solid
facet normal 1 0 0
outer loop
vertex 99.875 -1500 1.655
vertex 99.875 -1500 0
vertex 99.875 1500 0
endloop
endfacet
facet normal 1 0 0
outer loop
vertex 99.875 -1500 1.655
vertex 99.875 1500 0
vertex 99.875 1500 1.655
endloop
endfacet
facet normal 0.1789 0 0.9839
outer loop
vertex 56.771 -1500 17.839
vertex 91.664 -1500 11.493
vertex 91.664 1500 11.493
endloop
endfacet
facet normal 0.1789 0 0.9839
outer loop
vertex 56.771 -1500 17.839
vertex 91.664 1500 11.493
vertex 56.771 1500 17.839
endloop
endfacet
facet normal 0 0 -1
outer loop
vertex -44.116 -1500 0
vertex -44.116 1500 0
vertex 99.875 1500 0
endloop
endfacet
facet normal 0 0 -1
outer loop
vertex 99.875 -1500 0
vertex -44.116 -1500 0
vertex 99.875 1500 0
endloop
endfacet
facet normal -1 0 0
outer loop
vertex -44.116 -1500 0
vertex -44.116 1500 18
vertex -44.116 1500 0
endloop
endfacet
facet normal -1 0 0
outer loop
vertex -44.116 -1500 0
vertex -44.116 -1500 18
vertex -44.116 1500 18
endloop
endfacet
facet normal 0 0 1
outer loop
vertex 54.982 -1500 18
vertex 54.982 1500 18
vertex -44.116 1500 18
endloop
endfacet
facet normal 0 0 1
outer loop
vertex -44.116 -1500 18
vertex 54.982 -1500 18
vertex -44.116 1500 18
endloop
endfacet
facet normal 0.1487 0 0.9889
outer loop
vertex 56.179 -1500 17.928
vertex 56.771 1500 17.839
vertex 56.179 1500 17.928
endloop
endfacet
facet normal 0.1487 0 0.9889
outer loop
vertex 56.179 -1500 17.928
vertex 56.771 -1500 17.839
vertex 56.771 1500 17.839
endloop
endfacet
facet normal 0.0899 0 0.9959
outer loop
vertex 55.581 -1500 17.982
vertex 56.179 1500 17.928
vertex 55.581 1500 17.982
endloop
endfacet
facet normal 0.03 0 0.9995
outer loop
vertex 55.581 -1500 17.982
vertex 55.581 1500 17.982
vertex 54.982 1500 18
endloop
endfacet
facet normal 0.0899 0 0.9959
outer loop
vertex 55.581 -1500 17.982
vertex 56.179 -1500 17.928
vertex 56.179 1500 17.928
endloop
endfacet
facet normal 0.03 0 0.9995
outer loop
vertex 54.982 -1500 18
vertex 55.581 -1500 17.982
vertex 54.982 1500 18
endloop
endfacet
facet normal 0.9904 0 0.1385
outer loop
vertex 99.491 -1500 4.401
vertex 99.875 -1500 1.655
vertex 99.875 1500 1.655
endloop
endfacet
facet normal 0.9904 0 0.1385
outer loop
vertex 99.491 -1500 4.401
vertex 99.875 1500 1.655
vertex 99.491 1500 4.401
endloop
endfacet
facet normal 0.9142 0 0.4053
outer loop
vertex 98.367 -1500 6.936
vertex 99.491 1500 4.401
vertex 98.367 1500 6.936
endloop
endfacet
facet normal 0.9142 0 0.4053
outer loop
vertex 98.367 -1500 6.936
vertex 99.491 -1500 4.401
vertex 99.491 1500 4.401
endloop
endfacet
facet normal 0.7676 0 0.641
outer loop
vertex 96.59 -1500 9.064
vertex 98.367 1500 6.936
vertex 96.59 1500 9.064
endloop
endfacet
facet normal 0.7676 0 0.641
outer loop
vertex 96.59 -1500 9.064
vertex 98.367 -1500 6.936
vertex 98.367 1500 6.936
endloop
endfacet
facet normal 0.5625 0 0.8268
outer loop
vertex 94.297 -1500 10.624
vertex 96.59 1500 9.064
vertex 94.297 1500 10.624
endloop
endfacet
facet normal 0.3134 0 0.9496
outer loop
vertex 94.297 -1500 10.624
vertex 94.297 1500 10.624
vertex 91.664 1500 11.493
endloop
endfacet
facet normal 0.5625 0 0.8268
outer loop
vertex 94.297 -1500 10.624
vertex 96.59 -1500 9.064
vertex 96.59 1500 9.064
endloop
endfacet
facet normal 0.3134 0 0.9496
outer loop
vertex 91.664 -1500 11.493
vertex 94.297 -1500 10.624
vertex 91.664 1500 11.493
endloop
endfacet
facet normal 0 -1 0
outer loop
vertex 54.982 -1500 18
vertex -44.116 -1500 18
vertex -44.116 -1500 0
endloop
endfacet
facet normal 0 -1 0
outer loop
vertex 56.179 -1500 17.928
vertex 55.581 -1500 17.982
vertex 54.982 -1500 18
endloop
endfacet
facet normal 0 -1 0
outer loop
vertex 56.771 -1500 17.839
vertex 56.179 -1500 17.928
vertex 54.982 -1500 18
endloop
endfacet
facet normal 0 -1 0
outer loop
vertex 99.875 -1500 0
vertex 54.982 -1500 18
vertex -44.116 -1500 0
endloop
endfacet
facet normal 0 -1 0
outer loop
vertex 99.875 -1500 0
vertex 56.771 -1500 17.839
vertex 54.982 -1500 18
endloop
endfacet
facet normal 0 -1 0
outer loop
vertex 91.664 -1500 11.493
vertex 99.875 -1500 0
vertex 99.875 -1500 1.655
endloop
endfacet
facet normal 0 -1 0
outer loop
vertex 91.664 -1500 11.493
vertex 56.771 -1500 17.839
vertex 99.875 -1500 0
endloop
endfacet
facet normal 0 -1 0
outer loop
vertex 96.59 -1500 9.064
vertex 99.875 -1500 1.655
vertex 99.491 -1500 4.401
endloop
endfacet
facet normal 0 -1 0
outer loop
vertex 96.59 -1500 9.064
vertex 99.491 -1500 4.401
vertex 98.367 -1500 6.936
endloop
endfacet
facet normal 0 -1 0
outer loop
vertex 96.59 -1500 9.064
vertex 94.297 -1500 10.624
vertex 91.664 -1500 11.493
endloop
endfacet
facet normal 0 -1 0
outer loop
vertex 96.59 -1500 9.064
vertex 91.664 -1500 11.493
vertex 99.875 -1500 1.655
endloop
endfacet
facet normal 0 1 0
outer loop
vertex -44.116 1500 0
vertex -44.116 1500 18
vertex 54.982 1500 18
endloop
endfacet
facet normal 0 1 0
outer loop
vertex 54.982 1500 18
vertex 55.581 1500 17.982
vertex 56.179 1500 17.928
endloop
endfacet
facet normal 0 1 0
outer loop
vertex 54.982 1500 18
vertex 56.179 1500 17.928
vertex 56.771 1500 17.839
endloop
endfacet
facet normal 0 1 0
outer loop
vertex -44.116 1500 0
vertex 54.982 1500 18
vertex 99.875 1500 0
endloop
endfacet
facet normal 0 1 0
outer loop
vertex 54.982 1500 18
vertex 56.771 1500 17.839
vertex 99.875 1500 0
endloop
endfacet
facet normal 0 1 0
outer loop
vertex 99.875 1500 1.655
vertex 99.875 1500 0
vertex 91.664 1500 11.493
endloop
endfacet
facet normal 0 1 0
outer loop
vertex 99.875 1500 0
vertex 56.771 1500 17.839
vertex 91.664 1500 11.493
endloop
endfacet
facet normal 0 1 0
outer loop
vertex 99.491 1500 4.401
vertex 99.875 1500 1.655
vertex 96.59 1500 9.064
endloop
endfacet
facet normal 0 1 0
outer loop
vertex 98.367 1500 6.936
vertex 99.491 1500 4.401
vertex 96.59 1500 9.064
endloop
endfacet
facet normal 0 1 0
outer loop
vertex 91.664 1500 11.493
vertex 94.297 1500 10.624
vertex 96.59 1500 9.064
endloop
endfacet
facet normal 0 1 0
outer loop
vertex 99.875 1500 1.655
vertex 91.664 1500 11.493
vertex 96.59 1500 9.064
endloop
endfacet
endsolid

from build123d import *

# Parameters (mm, degrees)
F1_DEPTH = 1500


with BuildPart() as f1:
    # F0 (on Front) → F1 (new body, symmetric)
    with BuildSketch(Plane.XZ):
        with BuildLine():
            Line((-44.1159044445, 18), (-44.1159044445, 0))
            Line((-44.1159044445, 0), (99.8750251315, 0))
            Line((99.8750251315, 0), (99.8750251315, 1.6545442854))
            ThreePointArc((99.8750251315, 1.6545442854), (97.5526586916, 8.0618793723), (91.6642365482, 11.4931784643))
            Line((91.6642365482, 11.4931784643), (56.7714246145, 17.8386341789))
            ThreePointArc((56.7714246145, 17.8386341789), (55.8804498623, 17.9595768431), (54.9822131977, 18))
            Line((54.9822131977, 18), (-44.1159044445, 18))
        make_face()
    extrude(amount=F1_DEPTH, both=True)


solid = f1.part
